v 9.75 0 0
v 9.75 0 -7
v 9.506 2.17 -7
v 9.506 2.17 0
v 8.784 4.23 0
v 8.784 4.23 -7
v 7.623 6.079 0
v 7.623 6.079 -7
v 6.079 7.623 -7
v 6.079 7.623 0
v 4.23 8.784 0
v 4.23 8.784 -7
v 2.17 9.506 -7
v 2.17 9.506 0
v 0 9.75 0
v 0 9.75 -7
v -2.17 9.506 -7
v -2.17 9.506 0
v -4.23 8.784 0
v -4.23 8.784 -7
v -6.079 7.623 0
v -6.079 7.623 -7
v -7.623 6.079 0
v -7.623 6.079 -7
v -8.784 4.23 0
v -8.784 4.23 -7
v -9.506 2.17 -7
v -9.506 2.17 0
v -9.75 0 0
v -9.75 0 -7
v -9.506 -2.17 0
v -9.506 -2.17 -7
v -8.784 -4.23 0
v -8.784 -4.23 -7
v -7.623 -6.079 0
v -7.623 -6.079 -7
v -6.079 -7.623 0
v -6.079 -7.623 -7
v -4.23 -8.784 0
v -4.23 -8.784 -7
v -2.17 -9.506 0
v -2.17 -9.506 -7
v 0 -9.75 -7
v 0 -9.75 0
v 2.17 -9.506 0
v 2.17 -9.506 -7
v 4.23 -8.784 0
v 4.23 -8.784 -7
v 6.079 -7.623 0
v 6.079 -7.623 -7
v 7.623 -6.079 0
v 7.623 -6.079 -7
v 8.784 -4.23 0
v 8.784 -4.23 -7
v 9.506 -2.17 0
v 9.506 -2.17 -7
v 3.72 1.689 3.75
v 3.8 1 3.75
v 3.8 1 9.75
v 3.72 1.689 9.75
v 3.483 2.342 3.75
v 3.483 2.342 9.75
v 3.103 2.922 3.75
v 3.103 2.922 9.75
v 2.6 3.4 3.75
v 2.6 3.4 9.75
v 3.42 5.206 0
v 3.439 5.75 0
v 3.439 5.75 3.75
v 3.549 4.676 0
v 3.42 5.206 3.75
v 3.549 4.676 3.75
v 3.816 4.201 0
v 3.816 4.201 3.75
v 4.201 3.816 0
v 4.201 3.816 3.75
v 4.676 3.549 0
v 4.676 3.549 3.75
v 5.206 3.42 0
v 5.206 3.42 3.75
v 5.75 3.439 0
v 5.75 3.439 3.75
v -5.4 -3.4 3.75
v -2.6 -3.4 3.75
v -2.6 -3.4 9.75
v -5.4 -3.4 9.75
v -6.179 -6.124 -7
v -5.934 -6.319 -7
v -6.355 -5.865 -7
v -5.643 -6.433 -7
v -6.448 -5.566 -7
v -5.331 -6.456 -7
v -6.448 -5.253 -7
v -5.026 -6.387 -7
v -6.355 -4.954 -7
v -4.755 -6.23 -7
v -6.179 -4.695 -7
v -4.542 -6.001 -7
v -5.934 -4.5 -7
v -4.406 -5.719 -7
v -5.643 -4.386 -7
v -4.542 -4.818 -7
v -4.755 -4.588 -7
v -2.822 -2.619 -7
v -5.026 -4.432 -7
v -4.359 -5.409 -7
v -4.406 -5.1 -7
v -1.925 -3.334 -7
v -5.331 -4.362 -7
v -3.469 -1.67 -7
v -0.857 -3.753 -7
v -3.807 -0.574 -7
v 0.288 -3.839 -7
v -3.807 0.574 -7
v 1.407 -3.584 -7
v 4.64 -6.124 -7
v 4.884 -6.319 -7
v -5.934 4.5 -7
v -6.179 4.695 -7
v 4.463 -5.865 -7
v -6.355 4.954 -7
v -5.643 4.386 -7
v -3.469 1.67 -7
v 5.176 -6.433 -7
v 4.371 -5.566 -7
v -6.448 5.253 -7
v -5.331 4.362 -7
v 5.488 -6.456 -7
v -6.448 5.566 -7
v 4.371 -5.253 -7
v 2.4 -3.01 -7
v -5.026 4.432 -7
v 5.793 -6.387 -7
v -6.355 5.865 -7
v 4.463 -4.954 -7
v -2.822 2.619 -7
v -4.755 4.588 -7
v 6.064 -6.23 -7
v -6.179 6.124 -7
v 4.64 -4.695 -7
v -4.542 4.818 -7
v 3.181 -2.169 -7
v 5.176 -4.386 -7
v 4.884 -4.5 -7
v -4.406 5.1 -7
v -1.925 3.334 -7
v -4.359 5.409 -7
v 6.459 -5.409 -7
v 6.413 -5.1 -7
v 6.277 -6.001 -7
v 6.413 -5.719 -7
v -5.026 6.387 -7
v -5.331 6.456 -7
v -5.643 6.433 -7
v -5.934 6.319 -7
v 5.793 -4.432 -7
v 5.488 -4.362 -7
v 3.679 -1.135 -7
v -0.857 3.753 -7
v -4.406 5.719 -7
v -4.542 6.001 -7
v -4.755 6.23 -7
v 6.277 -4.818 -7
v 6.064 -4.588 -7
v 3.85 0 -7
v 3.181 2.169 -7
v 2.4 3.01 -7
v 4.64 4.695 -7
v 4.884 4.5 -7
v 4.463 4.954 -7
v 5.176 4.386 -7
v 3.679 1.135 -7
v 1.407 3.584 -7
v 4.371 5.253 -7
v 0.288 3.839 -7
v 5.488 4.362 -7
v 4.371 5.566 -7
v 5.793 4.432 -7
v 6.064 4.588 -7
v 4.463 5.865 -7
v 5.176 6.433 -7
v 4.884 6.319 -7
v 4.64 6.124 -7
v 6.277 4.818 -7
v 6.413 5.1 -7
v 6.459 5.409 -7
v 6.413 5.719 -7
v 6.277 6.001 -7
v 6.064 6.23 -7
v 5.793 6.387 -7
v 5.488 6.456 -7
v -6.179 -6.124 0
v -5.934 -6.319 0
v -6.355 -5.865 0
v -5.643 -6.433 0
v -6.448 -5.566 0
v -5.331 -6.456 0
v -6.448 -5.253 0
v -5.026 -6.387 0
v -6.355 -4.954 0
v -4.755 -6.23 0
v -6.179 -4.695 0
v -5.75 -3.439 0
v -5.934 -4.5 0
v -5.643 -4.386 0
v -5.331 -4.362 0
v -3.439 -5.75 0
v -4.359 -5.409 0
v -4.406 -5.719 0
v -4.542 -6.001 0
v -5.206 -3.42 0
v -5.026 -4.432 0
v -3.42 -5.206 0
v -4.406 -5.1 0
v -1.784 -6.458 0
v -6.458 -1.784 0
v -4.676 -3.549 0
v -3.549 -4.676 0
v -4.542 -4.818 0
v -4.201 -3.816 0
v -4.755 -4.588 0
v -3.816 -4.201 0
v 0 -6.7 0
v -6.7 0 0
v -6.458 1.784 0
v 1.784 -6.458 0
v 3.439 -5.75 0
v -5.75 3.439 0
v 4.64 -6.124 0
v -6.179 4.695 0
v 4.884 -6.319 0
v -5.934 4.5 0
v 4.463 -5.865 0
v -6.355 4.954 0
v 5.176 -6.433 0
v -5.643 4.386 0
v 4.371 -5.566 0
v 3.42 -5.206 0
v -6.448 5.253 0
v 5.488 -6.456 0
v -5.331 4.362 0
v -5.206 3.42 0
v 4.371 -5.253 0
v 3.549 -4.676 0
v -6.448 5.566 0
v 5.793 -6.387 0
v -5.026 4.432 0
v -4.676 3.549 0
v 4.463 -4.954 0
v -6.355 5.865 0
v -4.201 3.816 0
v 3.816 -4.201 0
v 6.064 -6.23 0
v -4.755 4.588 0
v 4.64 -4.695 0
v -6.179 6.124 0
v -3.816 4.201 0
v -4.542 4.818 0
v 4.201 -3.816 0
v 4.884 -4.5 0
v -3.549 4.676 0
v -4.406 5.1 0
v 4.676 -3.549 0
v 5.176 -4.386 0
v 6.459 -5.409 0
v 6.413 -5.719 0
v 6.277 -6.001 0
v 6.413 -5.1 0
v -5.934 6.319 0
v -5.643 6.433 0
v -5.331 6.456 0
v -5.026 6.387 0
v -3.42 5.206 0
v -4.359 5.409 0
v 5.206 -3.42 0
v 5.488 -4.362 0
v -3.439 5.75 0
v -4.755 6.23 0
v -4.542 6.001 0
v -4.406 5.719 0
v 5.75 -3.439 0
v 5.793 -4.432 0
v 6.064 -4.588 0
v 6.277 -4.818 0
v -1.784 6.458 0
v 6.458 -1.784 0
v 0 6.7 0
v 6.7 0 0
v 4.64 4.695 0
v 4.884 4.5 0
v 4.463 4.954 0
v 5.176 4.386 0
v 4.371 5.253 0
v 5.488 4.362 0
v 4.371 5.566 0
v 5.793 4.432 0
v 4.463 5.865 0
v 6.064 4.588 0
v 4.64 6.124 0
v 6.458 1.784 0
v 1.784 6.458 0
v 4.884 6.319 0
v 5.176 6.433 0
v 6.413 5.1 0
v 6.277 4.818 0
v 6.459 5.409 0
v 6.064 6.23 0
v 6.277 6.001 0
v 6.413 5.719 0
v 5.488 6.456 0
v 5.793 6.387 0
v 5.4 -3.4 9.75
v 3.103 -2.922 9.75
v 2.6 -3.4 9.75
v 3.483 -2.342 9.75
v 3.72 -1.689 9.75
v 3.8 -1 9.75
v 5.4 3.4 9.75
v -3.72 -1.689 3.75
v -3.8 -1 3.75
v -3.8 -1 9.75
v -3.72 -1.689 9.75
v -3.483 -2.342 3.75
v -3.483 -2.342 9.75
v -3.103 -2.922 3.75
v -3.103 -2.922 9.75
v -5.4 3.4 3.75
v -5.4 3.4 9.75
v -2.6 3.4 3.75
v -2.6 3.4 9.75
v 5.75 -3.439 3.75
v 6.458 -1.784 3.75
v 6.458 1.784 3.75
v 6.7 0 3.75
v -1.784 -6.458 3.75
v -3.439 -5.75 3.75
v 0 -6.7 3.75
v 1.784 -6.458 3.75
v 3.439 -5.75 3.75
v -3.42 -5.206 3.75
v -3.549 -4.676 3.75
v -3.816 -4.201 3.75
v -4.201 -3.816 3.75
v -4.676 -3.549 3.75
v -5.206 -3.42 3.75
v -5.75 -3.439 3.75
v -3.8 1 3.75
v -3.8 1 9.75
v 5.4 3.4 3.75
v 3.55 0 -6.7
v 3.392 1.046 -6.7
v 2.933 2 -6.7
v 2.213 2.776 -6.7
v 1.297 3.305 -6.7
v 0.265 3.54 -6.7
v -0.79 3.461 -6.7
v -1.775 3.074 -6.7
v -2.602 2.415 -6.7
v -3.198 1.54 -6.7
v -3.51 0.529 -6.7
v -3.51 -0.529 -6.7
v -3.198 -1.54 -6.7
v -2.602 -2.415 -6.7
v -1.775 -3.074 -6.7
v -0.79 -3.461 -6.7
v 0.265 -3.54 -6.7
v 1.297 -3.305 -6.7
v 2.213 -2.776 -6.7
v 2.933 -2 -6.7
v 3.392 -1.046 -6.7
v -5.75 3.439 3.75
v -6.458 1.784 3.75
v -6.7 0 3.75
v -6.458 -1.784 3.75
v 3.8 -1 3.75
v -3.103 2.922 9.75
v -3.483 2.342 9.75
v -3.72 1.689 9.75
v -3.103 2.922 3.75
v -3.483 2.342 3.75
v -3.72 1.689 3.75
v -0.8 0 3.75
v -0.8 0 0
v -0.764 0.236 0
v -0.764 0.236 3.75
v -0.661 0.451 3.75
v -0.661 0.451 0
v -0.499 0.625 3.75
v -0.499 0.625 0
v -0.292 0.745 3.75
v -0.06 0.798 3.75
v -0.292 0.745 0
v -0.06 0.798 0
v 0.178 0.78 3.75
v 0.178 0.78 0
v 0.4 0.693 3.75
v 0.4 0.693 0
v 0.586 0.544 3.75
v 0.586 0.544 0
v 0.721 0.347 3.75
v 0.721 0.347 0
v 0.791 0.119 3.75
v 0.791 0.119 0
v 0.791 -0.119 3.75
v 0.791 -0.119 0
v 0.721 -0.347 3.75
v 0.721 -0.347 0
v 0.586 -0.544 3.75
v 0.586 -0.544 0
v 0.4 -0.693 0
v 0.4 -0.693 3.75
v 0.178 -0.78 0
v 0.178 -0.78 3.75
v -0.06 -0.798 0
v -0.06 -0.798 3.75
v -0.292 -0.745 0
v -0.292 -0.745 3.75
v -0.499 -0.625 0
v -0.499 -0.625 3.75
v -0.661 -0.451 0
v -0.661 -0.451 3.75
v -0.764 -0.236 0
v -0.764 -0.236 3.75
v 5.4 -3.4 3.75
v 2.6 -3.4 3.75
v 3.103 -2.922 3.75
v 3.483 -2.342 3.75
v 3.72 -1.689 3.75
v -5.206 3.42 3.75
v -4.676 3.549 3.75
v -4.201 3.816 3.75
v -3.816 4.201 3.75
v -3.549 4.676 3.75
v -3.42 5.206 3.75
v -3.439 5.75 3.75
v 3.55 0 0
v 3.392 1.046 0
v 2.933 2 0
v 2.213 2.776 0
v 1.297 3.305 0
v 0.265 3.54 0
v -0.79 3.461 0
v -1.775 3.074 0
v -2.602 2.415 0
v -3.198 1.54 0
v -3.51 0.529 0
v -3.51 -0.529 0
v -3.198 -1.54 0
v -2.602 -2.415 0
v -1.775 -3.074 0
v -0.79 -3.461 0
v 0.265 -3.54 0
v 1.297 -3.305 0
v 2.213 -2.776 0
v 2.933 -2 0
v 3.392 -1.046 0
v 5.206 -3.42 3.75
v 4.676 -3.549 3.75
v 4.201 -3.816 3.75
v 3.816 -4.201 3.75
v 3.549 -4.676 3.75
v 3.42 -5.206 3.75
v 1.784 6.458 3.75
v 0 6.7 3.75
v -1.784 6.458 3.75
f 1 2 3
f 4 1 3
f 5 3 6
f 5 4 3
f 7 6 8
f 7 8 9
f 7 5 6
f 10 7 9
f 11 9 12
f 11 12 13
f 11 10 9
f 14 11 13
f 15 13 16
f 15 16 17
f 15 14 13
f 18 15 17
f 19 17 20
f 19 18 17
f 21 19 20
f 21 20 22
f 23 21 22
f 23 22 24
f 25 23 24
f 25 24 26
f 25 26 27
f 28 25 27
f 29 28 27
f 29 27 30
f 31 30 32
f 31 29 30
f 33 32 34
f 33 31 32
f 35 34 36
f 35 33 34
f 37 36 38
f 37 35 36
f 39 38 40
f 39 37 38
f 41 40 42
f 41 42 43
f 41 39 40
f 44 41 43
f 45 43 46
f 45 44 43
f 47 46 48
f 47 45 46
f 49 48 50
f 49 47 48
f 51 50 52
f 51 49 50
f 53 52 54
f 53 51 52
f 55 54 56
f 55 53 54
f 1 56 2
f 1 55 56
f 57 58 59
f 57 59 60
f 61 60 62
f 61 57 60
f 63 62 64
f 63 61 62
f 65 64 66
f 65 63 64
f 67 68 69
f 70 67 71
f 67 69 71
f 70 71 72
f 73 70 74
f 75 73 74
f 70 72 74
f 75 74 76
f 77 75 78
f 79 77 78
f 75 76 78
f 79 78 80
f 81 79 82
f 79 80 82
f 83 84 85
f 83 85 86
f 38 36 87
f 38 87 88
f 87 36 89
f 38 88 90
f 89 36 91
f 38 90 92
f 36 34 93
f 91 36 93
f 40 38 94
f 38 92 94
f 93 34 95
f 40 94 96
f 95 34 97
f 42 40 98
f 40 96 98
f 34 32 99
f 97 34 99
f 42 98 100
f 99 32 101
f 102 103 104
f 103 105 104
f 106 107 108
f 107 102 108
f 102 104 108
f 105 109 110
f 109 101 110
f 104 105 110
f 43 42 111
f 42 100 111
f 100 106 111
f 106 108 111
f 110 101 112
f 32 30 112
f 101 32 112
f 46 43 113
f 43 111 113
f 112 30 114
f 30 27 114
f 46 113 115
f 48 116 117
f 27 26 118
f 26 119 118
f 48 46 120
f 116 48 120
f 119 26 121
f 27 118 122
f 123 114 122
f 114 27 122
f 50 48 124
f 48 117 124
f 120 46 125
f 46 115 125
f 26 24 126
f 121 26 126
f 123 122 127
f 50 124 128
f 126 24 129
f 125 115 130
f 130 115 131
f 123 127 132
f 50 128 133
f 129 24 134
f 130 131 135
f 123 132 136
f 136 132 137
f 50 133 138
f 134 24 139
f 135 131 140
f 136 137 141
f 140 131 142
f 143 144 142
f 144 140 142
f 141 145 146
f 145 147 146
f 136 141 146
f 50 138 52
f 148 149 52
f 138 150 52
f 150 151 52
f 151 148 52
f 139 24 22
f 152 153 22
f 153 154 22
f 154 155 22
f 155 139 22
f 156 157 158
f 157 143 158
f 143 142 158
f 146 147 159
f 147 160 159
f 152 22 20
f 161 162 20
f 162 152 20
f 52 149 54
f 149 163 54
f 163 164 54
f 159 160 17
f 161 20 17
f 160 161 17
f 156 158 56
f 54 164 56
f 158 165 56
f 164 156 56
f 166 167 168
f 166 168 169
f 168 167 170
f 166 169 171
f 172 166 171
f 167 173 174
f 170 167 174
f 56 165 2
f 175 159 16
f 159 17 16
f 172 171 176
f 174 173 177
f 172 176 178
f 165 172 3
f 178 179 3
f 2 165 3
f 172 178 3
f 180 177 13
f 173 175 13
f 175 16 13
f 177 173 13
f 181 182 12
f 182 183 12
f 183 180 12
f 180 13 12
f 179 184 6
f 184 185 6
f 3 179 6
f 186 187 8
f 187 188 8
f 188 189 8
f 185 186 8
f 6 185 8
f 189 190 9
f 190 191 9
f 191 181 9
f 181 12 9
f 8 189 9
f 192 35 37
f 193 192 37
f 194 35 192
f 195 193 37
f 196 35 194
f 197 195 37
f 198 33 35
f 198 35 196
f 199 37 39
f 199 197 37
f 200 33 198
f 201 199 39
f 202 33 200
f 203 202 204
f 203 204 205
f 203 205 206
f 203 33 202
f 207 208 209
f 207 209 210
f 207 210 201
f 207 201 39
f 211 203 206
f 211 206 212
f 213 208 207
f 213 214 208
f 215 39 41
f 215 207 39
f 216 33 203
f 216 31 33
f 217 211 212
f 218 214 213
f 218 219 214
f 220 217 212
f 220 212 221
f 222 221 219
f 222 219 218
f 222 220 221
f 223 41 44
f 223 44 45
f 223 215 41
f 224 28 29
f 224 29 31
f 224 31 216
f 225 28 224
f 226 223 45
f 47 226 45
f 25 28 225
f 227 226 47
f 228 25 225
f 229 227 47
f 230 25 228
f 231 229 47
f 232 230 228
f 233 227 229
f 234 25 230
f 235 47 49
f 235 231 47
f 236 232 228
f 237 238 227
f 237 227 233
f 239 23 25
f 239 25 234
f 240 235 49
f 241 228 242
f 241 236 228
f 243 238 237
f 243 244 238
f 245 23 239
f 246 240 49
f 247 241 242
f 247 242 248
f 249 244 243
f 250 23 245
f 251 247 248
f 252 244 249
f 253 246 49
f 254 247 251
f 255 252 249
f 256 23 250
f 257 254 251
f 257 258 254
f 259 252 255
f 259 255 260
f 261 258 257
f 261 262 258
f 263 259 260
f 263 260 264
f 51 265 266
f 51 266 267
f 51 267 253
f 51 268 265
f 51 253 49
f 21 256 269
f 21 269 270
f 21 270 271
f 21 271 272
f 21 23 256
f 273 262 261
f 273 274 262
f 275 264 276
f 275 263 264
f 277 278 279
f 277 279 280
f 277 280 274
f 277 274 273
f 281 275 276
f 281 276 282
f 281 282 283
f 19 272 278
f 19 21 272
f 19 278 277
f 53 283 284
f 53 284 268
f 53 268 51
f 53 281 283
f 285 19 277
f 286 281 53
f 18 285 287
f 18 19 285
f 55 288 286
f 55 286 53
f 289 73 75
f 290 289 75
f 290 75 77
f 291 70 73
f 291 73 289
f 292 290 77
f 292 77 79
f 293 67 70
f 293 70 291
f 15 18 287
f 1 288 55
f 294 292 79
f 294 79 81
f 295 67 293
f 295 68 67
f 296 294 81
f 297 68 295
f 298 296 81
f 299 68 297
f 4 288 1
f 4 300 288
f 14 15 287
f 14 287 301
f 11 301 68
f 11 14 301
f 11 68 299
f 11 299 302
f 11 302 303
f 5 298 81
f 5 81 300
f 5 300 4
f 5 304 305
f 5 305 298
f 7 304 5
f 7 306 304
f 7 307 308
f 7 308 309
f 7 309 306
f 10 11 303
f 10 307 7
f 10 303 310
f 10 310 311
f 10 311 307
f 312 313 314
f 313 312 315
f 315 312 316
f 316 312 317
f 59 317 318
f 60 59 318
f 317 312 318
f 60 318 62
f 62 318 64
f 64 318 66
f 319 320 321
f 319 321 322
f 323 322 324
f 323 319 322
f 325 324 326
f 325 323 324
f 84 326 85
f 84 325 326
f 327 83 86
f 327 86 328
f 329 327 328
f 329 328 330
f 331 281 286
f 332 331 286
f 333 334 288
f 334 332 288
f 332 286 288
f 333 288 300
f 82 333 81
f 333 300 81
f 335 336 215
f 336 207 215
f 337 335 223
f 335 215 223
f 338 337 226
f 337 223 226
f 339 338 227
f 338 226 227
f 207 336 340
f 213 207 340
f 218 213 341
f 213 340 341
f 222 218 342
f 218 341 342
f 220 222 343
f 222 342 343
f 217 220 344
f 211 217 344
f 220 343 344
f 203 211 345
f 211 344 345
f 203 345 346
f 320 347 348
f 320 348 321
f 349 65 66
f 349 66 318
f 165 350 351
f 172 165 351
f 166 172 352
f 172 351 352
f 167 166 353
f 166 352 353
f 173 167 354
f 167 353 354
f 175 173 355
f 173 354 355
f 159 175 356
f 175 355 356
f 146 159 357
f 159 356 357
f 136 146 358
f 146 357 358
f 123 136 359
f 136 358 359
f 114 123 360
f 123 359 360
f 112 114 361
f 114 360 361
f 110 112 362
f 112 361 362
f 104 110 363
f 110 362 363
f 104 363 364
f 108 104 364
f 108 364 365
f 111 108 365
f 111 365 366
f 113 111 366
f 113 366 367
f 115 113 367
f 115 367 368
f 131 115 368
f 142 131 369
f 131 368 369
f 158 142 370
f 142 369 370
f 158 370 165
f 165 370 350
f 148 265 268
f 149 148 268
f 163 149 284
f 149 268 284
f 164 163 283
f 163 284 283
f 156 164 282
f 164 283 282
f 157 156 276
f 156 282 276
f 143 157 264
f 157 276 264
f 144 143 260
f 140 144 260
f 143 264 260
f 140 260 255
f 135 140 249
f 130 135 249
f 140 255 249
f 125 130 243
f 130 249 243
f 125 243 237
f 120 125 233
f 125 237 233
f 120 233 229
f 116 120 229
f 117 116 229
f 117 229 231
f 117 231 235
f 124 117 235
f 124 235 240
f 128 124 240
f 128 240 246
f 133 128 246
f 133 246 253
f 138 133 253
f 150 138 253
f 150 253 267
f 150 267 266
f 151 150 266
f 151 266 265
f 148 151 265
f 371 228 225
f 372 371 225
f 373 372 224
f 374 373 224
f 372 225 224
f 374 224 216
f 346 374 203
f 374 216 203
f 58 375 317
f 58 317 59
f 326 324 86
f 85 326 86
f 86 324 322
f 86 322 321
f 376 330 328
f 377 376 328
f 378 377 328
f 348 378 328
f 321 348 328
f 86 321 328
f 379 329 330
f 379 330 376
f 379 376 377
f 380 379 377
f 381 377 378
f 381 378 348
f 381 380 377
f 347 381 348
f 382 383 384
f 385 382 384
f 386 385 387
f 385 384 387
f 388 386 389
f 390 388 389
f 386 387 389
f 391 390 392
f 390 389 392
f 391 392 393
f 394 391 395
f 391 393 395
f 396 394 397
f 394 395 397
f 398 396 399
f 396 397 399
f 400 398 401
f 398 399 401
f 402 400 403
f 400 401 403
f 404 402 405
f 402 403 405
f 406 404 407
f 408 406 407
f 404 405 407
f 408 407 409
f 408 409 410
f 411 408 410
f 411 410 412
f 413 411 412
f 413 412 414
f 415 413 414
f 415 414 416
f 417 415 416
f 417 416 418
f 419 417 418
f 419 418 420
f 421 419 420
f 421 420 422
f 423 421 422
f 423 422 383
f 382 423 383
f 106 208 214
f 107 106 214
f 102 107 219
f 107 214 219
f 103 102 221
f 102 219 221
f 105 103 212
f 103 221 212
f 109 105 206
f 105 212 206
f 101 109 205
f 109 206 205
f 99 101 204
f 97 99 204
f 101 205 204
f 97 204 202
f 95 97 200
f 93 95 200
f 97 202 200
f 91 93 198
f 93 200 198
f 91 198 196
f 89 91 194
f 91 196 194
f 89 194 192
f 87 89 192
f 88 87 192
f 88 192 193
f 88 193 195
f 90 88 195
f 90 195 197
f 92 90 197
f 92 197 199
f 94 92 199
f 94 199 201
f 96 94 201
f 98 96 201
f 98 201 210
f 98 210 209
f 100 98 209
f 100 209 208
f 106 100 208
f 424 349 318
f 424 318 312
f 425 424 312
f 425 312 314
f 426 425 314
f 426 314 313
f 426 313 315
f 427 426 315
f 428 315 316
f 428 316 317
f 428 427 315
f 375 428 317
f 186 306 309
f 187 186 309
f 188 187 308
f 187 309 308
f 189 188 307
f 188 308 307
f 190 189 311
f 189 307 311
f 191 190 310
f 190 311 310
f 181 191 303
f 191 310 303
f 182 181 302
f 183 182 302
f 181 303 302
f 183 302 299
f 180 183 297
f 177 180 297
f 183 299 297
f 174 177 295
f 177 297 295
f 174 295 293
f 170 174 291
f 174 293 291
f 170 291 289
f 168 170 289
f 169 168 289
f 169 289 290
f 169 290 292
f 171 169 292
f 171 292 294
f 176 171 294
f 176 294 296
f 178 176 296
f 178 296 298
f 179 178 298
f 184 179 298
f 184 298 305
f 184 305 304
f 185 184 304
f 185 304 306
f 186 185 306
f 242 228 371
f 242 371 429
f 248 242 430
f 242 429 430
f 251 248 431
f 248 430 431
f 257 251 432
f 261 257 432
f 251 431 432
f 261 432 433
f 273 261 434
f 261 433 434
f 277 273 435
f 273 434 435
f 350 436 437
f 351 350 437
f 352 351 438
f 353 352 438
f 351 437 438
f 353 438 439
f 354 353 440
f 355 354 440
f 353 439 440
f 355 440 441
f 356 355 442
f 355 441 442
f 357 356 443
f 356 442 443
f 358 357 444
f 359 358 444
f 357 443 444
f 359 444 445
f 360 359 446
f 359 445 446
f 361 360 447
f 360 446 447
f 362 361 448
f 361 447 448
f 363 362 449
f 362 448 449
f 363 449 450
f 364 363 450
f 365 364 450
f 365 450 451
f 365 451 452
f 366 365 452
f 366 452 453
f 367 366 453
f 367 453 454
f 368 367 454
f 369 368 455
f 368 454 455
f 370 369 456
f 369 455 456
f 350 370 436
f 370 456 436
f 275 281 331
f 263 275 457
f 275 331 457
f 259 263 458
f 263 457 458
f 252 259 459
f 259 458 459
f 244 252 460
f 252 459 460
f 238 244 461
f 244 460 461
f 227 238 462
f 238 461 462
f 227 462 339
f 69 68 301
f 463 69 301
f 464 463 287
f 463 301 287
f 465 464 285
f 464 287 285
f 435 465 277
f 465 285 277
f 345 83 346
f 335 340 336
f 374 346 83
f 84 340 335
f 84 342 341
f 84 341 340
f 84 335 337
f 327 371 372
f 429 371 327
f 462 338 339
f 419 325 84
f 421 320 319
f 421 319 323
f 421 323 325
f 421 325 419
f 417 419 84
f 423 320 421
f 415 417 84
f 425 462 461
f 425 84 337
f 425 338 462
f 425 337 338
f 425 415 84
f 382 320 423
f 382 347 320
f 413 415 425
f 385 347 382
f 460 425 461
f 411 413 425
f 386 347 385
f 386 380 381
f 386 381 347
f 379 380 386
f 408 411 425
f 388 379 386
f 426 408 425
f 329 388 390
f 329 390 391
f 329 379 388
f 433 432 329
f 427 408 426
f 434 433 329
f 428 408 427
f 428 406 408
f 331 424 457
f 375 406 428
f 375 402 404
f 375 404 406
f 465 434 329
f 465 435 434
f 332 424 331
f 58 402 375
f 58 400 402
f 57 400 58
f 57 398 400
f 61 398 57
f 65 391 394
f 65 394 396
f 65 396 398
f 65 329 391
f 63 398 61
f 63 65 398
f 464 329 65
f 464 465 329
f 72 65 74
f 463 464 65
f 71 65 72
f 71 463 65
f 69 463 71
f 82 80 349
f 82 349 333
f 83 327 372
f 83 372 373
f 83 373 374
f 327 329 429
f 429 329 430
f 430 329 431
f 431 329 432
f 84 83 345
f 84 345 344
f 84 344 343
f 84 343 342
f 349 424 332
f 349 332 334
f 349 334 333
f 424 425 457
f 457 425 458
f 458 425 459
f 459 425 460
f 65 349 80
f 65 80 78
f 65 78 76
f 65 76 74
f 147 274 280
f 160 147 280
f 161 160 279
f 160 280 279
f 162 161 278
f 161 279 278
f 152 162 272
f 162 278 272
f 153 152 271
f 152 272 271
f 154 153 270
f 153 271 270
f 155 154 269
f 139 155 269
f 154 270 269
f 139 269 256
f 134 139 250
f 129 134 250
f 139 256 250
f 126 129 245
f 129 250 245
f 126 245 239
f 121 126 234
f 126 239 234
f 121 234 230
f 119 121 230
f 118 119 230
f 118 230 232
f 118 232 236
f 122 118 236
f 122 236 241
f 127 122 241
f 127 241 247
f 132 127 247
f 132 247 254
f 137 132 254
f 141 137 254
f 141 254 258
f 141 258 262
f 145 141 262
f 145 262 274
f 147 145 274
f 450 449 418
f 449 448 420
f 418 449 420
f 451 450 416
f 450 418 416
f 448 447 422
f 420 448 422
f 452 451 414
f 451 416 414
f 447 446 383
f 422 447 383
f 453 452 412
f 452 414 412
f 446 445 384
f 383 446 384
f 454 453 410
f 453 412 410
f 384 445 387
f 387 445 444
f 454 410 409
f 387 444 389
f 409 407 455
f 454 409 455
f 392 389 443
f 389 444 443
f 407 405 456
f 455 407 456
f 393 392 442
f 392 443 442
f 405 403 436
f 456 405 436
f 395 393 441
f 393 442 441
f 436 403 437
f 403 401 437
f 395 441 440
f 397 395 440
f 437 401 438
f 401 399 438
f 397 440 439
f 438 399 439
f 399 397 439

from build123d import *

# Parameters (mm, degrees)
SKIZZE1_R                       = 6.7
AUFSATZ_LINEAR_AUSTRAGEN1_DEPTH = 3.75
SKIZZE1_7_R                     = 9.75
SKIZZE1_7_R_2                   = 3.55
AUFSATZ_LINEAR_AUSTRAGEN2_DEPTH = 7
SKIZZE5_R                       = 1.05
SCHNITT_LINEAR_AUSTRAGEN1_DEPTH = 11.75
SKIZZE5_3_R                     = 2
SKIZZE5_3_R_2                   = 1.05
SCHNITT_LINEAR_AUSTRAGEN2_DEPTH = 3.75
FASE1_SIZE                      = 0.3
AUFSATZ_LINEAR_AUSTRAGEN4_DEPTH = 6
M2_GEWINDEBOHRUNG1_D            = 1.6


with BuildPart() as part:
    # Skizze1 → Aufsatz-Linear austragen1 (new body)
    with BuildSketch(Plane.XY):
        Circle(SKIZZE1_R)
    extrude(amount=AUFSATZ_LINEAR_AUSTRAGEN1_DEPTH)

    # Skizze1<7> → Aufsatz-Linear austragen2 (add)
    with BuildSketch(Plane.XY):
        Circle(SKIZZE1_7_R)
        Circle(SKIZZE1_7_R_2, mode=Mode.SUBTRACT)
    extrude(amount=-AUFSATZ_LINEAR_AUSTRAGEN2_DEPTH)

    # Skizze5 → Schnitt-Linear austragen1 (cut, through all)
    with BuildSketch(Plane.XY.offset(3.75)):
        with Locations((5.409366876, 5.409366876)):
            Circle(SKIZZE5_R)
        with Locations((5.409366876, -5.409366876)):
            Circle(SKIZZE5_R)
        with Locations((-5.409366876, -5.409366876)):
            Circle(SKIZZE5_R)
        with Locations((-5.409366876, 5.409366876)):
            Circle(SKIZZE5_R)
    extrude(amount=-SCHNITT_LINEAR_AUSTRAGEN1_DEPTH, mode=Mode.SUBTRACT)

    # Skizze5<3> → Schnitt-Linear austragen2 (cut)
    with BuildSketch(Plane.XY.offset(3.75)):
        with Locations((-5.409366876, 5.409366876)):
            Circle(SKIZZE5_3_R)
        with Locations((-5.409366876, 5.409366876)):
            Circle(SKIZZE5_3_R_2, mode=Mode.SUBTRACT)
        with Locations((5.409366876, 5.409366876)):
            Circle(SKIZZE5_3_R)
        with Locations((5.409366876, 5.409366876)):
            Circle(SKIZZE5_3_R_2, mode=Mode.SUBTRACT)
        with Locations((5.409366876, -5.409366876)):
            Circle(SKIZZE5_3_R)
        with Locations((5.409366876, -5.409366876)):
            Circle(SKIZZE5_3_R_2, mode=Mode.SUBTRACT)
        with Locations((-5.409366876, -5.409366876)):
            Circle(SKIZZE5_3_R)
        with Locations((-5.409366876, -5.409366876)):
            Circle(SKIZZE5_3_R_2, mode=Mode.SUBTRACT)
    extrude(amount=-SCHNITT_LINEAR_AUSTRAGEN2_DEPTH, mode=Mode.SUBTRACT)

    # Fase1
    fase1_edges = [part.edges().sort_by_distance(p)[0] for p in [
        (-3.55, 0, -7),
    ]]
    chamfer(fase1_edges, length=FASE1_SIZE)

    # Skizze7 → Aufsatz-Linear austragen4 (add)
    with BuildSketch(Plane.XY.offset(3.75)):
        with BuildLine():
            Line((-5.4, 3.4), (-2.6, 3.4))
            ThreePointArc((-2.6, 3.4), (-3.483281573, 2.341640786), (-3.8, 1))
            Line((-3.8, 1), (-3.8, -1))
            ThreePointArc((-3.8, -1), (-3.483281573, -2.341640786), (-2.6, -3.4))
            Line((-2.6, -3.4), (-5.4, -3.4))
            Line((-5.4, -3.4), (-5.4, 3.4))
        make_face()
        with BuildLine():
            Line((5.4, -3.4), (2.6, -3.4))
            ThreePointArc((2.6, -3.4), (3.483281573, -2.341640786), (3.8, -1))
            Line((3.8, -1), (3.8, 1))
            ThreePointArc((3.8, 1), (3.483281573, 2.341640786), (2.6, 3.4))
            Line((2.6, 3.4), (5.4, 3.4))
            Line((5.4, 3.4), (5.4, -3.4))
        make_face()
    extrude(amount=AUFSATZ_LINEAR_AUSTRAGEN4_DEPTH)

    # M2 Gewindebohrung1 (through all)
    with Locations(Plane.XY.offset(3.75)):
        with Locations((0, 0)):
            Hole(M2_GEWINDEBOHRUNG1_D / 2)


solid = part.part
